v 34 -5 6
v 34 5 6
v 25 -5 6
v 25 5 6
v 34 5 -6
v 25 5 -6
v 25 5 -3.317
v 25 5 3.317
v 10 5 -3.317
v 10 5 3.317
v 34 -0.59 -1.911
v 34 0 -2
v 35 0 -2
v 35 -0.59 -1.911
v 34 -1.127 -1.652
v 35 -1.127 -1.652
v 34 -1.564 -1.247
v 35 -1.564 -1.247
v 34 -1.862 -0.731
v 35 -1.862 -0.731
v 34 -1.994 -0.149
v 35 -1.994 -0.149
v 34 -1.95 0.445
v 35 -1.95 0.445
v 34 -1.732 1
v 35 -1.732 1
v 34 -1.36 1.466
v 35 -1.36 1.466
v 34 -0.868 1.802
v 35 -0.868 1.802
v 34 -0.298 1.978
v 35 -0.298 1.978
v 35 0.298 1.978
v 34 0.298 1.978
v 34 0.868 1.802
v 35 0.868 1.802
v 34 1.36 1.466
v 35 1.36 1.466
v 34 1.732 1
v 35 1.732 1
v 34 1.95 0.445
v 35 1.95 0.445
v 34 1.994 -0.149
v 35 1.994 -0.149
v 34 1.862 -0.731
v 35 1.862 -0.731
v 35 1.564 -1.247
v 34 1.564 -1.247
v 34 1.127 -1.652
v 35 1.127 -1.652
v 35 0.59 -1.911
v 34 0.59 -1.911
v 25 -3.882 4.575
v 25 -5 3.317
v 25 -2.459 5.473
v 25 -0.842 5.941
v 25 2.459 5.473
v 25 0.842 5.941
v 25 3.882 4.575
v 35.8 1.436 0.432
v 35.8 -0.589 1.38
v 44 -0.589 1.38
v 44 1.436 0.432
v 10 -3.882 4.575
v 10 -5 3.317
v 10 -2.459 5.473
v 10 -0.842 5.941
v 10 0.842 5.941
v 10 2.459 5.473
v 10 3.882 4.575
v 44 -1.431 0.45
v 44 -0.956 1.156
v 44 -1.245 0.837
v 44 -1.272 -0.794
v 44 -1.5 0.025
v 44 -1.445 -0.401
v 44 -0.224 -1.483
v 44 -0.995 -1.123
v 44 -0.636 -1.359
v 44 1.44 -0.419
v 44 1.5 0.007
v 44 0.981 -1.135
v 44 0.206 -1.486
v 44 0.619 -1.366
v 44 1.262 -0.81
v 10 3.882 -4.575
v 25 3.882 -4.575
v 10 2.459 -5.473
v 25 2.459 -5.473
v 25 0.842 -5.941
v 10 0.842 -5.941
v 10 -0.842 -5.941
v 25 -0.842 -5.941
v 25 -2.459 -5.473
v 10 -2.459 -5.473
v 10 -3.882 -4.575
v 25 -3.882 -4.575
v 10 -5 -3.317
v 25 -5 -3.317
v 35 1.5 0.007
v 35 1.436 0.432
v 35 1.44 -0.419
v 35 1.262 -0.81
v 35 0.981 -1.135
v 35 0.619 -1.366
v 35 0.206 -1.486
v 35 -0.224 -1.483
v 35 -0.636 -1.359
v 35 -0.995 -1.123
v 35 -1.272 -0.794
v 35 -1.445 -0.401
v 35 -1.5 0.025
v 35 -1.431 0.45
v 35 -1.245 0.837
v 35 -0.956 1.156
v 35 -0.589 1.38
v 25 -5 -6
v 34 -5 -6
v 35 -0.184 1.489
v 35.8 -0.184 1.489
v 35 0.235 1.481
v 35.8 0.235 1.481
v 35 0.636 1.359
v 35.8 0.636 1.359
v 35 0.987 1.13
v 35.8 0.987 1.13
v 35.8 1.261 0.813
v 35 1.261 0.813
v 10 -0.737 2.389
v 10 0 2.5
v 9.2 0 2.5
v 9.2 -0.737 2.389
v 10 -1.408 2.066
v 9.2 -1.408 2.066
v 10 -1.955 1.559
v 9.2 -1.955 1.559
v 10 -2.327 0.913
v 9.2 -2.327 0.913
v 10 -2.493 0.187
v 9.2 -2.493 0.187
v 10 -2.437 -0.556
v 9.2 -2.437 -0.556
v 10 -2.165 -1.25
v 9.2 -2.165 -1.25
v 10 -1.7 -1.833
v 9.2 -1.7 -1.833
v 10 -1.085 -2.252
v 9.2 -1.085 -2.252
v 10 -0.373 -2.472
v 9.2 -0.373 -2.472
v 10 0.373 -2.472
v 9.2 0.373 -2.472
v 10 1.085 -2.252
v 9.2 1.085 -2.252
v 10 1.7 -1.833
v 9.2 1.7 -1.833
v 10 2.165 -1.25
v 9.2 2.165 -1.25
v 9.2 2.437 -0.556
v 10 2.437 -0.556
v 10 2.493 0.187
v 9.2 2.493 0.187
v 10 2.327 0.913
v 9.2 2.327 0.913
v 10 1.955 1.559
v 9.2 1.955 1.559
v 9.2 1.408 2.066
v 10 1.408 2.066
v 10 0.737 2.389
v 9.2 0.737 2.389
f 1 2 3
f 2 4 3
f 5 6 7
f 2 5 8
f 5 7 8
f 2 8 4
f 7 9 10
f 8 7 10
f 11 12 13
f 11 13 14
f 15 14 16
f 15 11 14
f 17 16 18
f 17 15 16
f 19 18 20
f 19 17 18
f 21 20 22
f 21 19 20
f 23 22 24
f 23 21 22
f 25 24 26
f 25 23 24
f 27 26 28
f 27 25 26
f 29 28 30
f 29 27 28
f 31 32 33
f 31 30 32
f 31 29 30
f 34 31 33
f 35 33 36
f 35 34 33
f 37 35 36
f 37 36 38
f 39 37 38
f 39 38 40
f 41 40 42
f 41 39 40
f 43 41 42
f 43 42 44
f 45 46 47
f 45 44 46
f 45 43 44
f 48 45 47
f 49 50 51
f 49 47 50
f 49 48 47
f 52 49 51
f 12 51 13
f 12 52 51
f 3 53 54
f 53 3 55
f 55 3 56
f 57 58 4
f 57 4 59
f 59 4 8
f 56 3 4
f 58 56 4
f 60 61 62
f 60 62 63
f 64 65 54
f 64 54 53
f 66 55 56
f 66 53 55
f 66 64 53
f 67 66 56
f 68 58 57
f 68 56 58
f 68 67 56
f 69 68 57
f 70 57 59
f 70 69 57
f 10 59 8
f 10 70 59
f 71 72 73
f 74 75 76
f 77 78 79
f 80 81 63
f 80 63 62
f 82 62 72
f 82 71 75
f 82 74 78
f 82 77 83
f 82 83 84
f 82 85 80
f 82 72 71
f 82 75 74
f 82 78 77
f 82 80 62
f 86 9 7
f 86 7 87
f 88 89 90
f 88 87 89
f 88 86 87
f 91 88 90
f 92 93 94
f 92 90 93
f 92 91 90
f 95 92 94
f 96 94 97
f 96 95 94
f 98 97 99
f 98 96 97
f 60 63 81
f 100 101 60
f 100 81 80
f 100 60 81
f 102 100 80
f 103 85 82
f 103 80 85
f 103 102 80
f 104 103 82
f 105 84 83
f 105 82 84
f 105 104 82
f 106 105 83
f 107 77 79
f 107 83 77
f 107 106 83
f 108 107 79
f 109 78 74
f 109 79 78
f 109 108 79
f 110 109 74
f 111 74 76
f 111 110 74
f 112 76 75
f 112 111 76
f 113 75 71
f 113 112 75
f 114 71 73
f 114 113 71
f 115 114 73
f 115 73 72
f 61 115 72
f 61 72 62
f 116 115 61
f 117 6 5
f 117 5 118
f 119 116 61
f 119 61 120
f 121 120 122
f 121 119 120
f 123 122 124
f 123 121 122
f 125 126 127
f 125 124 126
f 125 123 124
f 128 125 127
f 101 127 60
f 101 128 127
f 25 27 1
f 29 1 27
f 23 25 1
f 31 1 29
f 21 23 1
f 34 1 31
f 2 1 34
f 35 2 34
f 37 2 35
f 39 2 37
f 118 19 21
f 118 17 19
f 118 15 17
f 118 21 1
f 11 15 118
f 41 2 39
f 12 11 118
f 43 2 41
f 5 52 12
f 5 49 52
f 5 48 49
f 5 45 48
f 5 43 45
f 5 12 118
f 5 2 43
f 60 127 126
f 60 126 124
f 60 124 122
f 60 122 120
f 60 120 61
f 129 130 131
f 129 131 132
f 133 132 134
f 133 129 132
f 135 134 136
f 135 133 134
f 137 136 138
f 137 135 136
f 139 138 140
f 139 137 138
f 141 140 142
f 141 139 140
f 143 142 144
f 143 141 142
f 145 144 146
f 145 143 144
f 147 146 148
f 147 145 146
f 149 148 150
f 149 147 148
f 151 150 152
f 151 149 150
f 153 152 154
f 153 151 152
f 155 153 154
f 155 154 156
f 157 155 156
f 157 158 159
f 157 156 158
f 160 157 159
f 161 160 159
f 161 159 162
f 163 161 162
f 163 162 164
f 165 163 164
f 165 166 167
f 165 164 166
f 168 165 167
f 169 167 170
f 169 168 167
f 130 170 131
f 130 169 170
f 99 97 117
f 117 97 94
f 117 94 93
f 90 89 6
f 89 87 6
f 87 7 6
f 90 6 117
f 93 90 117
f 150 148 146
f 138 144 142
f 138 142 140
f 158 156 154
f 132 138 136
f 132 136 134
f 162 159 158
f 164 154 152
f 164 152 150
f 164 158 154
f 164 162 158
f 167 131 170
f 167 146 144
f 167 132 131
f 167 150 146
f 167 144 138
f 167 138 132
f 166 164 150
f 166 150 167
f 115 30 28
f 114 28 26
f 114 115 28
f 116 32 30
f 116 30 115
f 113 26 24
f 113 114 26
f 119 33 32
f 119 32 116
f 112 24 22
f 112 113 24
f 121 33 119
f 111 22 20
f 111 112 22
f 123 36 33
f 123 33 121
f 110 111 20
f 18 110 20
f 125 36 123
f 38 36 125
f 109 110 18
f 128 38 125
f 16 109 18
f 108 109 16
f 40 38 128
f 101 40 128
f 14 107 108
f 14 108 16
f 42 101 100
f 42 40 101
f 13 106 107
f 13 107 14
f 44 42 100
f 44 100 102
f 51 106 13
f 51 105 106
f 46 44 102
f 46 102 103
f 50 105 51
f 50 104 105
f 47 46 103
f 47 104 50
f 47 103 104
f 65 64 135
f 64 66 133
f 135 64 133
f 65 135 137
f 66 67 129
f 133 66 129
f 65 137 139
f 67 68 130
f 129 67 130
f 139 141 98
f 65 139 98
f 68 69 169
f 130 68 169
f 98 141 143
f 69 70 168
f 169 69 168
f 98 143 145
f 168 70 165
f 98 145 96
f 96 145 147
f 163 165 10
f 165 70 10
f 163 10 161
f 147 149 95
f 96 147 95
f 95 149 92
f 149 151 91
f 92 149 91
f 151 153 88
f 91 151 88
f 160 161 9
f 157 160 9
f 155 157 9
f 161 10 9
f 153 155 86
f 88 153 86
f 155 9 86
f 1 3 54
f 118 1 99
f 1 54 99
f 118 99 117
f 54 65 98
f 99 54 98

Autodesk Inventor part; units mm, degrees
ref_plane "YZ Plane" through (0, 0, 0) normal (1, 0, 0) x (0, 1, 0)
ref_plane "XZ Plane" through (0, 0, 0) normal (0, 1, 0) x (-1, 0, 0)
ref_plane "Pracovní rovina2" through (10, 0, 0) normal (1, 0, 0) x (0, 0, -1)
sketch "Náčrt1" plane through (10, 0, 0) normal (1, 0, 0) x (0, 0, -1)
  arc A0 (-3.3166, 5) -> (-3.3166, -5) centre (0, 0) ccw projected
  line L0 (3.3166, 5) -> (-3.3166, 5) projected
  arc A1 (3.3166, -5) -> (3.3166, 5) centre (0, 0) ccw projected
  line L1 (-3.3166, -5) -> (3.3166, -5) projected
  point P0 (0, 0)
extrude "Vysunutí1" add sketch "Náčrt1" along normal blind 15
sketch "Náčrt2" plane through (25, 0, 0) normal (1, 0, 0) x (0, 0, -1)
  line L0 (-6, 5) -> (-6, -5) projected
  line L1 (6, 5) -> (-6, 5) projected
  line L2 (6, 5) -> (6, -5) projected
  line L3 (-6, -5) -> (6, -5) projected
  point P0 (0, 0)
extrude "Vysunutí2" add sketch "Náčrt2" along normal blind 9
sketch "Náčrt3" plane through (34, 0, 0) normal (1, 0, 0) x (0, 0, -1)
  arc A0 (-1.3795, -0.589) -> (-0.4321, 1.4364) centre (0, 0) ccw projected
  line L0 (-1.3795, -0.589) -> (-0.4321, 1.4364) projected
  circle A1 centre (0, 0) radius 2 projected
  arc A2 (-0.4321, 1.4364) -> (-1.3795, -0.589) centre (0, 0) ccw projected
extrude "Vysunutí3" add sketch "Náčrt3" along normal blind 1
extrude "Vysunutí4" add sketch "Náčrt3" along normal blind 10 contours L0 A0
extrude "Vysunutí5" add sketch "Náčrt3" along normal blind 1.8 contours A2 L0
sketch "Náčrt4" plane through (10, 0, 0) normal (-1, 0, 0) x (0, 0, 1)
  circle A0 centre (0, 0) radius 2.5
  dimension "d12" = 5
extrude "Vysunutí6" add sketch "Náčrt4" along normal blind 0.8
properties part number "GA12-N20 Motor_finalV"
